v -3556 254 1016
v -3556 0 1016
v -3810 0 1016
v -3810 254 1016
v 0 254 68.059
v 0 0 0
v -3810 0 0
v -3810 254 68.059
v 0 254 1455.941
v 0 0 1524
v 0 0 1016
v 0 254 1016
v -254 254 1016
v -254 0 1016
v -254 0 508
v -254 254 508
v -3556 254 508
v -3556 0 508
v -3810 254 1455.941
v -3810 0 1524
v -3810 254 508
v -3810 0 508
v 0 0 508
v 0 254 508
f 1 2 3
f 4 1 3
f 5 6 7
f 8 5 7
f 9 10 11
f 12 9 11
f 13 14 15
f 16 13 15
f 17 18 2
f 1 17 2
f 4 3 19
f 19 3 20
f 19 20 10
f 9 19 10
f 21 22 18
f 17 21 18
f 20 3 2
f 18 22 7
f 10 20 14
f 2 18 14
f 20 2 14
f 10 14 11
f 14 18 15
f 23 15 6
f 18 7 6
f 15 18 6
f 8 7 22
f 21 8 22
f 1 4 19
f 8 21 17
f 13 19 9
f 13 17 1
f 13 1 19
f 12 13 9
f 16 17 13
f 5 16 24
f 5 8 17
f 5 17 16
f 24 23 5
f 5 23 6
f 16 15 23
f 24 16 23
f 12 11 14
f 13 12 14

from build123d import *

# Parameters (mm, degrees)
BOSS_EXTRUDE1_DEPTH = 254
DRAFT1_ANGLE        = -15


with BuildPart() as part:
    # Sketch2 → Boss-Extrude1 (new body)
    with BuildSketch(Plane(origin=(0, 0, 0), x_dir=(1, 0, 0), z_dir=(0, 1, 0))):
        Polygon((-3810, -1016), (-3810, -1524), (0, -1524), (0, -1016), (-254, -1016), (-254, -508), (0, -508), (0, 0), (-3810, 0), (-3810, -508), (-3556, -508), (-3556, -1016), align=None)
    extrude(amount=BOSS_EXTRUDE1_DEPTH)

    # Draft1
    draft1_faces = [part.faces().sort_by_distance(p)[0] for p in [
        (-1905, 127, 0),
        (-1905, 127, 1524),
    ]]
    draft(draft1_faces, Plane(origin=(0, 0, 0), x_dir=(0, 0, -1), z_dir=(0, -1, 0)), DRAFT1_ANGLE)


solid = part.part
